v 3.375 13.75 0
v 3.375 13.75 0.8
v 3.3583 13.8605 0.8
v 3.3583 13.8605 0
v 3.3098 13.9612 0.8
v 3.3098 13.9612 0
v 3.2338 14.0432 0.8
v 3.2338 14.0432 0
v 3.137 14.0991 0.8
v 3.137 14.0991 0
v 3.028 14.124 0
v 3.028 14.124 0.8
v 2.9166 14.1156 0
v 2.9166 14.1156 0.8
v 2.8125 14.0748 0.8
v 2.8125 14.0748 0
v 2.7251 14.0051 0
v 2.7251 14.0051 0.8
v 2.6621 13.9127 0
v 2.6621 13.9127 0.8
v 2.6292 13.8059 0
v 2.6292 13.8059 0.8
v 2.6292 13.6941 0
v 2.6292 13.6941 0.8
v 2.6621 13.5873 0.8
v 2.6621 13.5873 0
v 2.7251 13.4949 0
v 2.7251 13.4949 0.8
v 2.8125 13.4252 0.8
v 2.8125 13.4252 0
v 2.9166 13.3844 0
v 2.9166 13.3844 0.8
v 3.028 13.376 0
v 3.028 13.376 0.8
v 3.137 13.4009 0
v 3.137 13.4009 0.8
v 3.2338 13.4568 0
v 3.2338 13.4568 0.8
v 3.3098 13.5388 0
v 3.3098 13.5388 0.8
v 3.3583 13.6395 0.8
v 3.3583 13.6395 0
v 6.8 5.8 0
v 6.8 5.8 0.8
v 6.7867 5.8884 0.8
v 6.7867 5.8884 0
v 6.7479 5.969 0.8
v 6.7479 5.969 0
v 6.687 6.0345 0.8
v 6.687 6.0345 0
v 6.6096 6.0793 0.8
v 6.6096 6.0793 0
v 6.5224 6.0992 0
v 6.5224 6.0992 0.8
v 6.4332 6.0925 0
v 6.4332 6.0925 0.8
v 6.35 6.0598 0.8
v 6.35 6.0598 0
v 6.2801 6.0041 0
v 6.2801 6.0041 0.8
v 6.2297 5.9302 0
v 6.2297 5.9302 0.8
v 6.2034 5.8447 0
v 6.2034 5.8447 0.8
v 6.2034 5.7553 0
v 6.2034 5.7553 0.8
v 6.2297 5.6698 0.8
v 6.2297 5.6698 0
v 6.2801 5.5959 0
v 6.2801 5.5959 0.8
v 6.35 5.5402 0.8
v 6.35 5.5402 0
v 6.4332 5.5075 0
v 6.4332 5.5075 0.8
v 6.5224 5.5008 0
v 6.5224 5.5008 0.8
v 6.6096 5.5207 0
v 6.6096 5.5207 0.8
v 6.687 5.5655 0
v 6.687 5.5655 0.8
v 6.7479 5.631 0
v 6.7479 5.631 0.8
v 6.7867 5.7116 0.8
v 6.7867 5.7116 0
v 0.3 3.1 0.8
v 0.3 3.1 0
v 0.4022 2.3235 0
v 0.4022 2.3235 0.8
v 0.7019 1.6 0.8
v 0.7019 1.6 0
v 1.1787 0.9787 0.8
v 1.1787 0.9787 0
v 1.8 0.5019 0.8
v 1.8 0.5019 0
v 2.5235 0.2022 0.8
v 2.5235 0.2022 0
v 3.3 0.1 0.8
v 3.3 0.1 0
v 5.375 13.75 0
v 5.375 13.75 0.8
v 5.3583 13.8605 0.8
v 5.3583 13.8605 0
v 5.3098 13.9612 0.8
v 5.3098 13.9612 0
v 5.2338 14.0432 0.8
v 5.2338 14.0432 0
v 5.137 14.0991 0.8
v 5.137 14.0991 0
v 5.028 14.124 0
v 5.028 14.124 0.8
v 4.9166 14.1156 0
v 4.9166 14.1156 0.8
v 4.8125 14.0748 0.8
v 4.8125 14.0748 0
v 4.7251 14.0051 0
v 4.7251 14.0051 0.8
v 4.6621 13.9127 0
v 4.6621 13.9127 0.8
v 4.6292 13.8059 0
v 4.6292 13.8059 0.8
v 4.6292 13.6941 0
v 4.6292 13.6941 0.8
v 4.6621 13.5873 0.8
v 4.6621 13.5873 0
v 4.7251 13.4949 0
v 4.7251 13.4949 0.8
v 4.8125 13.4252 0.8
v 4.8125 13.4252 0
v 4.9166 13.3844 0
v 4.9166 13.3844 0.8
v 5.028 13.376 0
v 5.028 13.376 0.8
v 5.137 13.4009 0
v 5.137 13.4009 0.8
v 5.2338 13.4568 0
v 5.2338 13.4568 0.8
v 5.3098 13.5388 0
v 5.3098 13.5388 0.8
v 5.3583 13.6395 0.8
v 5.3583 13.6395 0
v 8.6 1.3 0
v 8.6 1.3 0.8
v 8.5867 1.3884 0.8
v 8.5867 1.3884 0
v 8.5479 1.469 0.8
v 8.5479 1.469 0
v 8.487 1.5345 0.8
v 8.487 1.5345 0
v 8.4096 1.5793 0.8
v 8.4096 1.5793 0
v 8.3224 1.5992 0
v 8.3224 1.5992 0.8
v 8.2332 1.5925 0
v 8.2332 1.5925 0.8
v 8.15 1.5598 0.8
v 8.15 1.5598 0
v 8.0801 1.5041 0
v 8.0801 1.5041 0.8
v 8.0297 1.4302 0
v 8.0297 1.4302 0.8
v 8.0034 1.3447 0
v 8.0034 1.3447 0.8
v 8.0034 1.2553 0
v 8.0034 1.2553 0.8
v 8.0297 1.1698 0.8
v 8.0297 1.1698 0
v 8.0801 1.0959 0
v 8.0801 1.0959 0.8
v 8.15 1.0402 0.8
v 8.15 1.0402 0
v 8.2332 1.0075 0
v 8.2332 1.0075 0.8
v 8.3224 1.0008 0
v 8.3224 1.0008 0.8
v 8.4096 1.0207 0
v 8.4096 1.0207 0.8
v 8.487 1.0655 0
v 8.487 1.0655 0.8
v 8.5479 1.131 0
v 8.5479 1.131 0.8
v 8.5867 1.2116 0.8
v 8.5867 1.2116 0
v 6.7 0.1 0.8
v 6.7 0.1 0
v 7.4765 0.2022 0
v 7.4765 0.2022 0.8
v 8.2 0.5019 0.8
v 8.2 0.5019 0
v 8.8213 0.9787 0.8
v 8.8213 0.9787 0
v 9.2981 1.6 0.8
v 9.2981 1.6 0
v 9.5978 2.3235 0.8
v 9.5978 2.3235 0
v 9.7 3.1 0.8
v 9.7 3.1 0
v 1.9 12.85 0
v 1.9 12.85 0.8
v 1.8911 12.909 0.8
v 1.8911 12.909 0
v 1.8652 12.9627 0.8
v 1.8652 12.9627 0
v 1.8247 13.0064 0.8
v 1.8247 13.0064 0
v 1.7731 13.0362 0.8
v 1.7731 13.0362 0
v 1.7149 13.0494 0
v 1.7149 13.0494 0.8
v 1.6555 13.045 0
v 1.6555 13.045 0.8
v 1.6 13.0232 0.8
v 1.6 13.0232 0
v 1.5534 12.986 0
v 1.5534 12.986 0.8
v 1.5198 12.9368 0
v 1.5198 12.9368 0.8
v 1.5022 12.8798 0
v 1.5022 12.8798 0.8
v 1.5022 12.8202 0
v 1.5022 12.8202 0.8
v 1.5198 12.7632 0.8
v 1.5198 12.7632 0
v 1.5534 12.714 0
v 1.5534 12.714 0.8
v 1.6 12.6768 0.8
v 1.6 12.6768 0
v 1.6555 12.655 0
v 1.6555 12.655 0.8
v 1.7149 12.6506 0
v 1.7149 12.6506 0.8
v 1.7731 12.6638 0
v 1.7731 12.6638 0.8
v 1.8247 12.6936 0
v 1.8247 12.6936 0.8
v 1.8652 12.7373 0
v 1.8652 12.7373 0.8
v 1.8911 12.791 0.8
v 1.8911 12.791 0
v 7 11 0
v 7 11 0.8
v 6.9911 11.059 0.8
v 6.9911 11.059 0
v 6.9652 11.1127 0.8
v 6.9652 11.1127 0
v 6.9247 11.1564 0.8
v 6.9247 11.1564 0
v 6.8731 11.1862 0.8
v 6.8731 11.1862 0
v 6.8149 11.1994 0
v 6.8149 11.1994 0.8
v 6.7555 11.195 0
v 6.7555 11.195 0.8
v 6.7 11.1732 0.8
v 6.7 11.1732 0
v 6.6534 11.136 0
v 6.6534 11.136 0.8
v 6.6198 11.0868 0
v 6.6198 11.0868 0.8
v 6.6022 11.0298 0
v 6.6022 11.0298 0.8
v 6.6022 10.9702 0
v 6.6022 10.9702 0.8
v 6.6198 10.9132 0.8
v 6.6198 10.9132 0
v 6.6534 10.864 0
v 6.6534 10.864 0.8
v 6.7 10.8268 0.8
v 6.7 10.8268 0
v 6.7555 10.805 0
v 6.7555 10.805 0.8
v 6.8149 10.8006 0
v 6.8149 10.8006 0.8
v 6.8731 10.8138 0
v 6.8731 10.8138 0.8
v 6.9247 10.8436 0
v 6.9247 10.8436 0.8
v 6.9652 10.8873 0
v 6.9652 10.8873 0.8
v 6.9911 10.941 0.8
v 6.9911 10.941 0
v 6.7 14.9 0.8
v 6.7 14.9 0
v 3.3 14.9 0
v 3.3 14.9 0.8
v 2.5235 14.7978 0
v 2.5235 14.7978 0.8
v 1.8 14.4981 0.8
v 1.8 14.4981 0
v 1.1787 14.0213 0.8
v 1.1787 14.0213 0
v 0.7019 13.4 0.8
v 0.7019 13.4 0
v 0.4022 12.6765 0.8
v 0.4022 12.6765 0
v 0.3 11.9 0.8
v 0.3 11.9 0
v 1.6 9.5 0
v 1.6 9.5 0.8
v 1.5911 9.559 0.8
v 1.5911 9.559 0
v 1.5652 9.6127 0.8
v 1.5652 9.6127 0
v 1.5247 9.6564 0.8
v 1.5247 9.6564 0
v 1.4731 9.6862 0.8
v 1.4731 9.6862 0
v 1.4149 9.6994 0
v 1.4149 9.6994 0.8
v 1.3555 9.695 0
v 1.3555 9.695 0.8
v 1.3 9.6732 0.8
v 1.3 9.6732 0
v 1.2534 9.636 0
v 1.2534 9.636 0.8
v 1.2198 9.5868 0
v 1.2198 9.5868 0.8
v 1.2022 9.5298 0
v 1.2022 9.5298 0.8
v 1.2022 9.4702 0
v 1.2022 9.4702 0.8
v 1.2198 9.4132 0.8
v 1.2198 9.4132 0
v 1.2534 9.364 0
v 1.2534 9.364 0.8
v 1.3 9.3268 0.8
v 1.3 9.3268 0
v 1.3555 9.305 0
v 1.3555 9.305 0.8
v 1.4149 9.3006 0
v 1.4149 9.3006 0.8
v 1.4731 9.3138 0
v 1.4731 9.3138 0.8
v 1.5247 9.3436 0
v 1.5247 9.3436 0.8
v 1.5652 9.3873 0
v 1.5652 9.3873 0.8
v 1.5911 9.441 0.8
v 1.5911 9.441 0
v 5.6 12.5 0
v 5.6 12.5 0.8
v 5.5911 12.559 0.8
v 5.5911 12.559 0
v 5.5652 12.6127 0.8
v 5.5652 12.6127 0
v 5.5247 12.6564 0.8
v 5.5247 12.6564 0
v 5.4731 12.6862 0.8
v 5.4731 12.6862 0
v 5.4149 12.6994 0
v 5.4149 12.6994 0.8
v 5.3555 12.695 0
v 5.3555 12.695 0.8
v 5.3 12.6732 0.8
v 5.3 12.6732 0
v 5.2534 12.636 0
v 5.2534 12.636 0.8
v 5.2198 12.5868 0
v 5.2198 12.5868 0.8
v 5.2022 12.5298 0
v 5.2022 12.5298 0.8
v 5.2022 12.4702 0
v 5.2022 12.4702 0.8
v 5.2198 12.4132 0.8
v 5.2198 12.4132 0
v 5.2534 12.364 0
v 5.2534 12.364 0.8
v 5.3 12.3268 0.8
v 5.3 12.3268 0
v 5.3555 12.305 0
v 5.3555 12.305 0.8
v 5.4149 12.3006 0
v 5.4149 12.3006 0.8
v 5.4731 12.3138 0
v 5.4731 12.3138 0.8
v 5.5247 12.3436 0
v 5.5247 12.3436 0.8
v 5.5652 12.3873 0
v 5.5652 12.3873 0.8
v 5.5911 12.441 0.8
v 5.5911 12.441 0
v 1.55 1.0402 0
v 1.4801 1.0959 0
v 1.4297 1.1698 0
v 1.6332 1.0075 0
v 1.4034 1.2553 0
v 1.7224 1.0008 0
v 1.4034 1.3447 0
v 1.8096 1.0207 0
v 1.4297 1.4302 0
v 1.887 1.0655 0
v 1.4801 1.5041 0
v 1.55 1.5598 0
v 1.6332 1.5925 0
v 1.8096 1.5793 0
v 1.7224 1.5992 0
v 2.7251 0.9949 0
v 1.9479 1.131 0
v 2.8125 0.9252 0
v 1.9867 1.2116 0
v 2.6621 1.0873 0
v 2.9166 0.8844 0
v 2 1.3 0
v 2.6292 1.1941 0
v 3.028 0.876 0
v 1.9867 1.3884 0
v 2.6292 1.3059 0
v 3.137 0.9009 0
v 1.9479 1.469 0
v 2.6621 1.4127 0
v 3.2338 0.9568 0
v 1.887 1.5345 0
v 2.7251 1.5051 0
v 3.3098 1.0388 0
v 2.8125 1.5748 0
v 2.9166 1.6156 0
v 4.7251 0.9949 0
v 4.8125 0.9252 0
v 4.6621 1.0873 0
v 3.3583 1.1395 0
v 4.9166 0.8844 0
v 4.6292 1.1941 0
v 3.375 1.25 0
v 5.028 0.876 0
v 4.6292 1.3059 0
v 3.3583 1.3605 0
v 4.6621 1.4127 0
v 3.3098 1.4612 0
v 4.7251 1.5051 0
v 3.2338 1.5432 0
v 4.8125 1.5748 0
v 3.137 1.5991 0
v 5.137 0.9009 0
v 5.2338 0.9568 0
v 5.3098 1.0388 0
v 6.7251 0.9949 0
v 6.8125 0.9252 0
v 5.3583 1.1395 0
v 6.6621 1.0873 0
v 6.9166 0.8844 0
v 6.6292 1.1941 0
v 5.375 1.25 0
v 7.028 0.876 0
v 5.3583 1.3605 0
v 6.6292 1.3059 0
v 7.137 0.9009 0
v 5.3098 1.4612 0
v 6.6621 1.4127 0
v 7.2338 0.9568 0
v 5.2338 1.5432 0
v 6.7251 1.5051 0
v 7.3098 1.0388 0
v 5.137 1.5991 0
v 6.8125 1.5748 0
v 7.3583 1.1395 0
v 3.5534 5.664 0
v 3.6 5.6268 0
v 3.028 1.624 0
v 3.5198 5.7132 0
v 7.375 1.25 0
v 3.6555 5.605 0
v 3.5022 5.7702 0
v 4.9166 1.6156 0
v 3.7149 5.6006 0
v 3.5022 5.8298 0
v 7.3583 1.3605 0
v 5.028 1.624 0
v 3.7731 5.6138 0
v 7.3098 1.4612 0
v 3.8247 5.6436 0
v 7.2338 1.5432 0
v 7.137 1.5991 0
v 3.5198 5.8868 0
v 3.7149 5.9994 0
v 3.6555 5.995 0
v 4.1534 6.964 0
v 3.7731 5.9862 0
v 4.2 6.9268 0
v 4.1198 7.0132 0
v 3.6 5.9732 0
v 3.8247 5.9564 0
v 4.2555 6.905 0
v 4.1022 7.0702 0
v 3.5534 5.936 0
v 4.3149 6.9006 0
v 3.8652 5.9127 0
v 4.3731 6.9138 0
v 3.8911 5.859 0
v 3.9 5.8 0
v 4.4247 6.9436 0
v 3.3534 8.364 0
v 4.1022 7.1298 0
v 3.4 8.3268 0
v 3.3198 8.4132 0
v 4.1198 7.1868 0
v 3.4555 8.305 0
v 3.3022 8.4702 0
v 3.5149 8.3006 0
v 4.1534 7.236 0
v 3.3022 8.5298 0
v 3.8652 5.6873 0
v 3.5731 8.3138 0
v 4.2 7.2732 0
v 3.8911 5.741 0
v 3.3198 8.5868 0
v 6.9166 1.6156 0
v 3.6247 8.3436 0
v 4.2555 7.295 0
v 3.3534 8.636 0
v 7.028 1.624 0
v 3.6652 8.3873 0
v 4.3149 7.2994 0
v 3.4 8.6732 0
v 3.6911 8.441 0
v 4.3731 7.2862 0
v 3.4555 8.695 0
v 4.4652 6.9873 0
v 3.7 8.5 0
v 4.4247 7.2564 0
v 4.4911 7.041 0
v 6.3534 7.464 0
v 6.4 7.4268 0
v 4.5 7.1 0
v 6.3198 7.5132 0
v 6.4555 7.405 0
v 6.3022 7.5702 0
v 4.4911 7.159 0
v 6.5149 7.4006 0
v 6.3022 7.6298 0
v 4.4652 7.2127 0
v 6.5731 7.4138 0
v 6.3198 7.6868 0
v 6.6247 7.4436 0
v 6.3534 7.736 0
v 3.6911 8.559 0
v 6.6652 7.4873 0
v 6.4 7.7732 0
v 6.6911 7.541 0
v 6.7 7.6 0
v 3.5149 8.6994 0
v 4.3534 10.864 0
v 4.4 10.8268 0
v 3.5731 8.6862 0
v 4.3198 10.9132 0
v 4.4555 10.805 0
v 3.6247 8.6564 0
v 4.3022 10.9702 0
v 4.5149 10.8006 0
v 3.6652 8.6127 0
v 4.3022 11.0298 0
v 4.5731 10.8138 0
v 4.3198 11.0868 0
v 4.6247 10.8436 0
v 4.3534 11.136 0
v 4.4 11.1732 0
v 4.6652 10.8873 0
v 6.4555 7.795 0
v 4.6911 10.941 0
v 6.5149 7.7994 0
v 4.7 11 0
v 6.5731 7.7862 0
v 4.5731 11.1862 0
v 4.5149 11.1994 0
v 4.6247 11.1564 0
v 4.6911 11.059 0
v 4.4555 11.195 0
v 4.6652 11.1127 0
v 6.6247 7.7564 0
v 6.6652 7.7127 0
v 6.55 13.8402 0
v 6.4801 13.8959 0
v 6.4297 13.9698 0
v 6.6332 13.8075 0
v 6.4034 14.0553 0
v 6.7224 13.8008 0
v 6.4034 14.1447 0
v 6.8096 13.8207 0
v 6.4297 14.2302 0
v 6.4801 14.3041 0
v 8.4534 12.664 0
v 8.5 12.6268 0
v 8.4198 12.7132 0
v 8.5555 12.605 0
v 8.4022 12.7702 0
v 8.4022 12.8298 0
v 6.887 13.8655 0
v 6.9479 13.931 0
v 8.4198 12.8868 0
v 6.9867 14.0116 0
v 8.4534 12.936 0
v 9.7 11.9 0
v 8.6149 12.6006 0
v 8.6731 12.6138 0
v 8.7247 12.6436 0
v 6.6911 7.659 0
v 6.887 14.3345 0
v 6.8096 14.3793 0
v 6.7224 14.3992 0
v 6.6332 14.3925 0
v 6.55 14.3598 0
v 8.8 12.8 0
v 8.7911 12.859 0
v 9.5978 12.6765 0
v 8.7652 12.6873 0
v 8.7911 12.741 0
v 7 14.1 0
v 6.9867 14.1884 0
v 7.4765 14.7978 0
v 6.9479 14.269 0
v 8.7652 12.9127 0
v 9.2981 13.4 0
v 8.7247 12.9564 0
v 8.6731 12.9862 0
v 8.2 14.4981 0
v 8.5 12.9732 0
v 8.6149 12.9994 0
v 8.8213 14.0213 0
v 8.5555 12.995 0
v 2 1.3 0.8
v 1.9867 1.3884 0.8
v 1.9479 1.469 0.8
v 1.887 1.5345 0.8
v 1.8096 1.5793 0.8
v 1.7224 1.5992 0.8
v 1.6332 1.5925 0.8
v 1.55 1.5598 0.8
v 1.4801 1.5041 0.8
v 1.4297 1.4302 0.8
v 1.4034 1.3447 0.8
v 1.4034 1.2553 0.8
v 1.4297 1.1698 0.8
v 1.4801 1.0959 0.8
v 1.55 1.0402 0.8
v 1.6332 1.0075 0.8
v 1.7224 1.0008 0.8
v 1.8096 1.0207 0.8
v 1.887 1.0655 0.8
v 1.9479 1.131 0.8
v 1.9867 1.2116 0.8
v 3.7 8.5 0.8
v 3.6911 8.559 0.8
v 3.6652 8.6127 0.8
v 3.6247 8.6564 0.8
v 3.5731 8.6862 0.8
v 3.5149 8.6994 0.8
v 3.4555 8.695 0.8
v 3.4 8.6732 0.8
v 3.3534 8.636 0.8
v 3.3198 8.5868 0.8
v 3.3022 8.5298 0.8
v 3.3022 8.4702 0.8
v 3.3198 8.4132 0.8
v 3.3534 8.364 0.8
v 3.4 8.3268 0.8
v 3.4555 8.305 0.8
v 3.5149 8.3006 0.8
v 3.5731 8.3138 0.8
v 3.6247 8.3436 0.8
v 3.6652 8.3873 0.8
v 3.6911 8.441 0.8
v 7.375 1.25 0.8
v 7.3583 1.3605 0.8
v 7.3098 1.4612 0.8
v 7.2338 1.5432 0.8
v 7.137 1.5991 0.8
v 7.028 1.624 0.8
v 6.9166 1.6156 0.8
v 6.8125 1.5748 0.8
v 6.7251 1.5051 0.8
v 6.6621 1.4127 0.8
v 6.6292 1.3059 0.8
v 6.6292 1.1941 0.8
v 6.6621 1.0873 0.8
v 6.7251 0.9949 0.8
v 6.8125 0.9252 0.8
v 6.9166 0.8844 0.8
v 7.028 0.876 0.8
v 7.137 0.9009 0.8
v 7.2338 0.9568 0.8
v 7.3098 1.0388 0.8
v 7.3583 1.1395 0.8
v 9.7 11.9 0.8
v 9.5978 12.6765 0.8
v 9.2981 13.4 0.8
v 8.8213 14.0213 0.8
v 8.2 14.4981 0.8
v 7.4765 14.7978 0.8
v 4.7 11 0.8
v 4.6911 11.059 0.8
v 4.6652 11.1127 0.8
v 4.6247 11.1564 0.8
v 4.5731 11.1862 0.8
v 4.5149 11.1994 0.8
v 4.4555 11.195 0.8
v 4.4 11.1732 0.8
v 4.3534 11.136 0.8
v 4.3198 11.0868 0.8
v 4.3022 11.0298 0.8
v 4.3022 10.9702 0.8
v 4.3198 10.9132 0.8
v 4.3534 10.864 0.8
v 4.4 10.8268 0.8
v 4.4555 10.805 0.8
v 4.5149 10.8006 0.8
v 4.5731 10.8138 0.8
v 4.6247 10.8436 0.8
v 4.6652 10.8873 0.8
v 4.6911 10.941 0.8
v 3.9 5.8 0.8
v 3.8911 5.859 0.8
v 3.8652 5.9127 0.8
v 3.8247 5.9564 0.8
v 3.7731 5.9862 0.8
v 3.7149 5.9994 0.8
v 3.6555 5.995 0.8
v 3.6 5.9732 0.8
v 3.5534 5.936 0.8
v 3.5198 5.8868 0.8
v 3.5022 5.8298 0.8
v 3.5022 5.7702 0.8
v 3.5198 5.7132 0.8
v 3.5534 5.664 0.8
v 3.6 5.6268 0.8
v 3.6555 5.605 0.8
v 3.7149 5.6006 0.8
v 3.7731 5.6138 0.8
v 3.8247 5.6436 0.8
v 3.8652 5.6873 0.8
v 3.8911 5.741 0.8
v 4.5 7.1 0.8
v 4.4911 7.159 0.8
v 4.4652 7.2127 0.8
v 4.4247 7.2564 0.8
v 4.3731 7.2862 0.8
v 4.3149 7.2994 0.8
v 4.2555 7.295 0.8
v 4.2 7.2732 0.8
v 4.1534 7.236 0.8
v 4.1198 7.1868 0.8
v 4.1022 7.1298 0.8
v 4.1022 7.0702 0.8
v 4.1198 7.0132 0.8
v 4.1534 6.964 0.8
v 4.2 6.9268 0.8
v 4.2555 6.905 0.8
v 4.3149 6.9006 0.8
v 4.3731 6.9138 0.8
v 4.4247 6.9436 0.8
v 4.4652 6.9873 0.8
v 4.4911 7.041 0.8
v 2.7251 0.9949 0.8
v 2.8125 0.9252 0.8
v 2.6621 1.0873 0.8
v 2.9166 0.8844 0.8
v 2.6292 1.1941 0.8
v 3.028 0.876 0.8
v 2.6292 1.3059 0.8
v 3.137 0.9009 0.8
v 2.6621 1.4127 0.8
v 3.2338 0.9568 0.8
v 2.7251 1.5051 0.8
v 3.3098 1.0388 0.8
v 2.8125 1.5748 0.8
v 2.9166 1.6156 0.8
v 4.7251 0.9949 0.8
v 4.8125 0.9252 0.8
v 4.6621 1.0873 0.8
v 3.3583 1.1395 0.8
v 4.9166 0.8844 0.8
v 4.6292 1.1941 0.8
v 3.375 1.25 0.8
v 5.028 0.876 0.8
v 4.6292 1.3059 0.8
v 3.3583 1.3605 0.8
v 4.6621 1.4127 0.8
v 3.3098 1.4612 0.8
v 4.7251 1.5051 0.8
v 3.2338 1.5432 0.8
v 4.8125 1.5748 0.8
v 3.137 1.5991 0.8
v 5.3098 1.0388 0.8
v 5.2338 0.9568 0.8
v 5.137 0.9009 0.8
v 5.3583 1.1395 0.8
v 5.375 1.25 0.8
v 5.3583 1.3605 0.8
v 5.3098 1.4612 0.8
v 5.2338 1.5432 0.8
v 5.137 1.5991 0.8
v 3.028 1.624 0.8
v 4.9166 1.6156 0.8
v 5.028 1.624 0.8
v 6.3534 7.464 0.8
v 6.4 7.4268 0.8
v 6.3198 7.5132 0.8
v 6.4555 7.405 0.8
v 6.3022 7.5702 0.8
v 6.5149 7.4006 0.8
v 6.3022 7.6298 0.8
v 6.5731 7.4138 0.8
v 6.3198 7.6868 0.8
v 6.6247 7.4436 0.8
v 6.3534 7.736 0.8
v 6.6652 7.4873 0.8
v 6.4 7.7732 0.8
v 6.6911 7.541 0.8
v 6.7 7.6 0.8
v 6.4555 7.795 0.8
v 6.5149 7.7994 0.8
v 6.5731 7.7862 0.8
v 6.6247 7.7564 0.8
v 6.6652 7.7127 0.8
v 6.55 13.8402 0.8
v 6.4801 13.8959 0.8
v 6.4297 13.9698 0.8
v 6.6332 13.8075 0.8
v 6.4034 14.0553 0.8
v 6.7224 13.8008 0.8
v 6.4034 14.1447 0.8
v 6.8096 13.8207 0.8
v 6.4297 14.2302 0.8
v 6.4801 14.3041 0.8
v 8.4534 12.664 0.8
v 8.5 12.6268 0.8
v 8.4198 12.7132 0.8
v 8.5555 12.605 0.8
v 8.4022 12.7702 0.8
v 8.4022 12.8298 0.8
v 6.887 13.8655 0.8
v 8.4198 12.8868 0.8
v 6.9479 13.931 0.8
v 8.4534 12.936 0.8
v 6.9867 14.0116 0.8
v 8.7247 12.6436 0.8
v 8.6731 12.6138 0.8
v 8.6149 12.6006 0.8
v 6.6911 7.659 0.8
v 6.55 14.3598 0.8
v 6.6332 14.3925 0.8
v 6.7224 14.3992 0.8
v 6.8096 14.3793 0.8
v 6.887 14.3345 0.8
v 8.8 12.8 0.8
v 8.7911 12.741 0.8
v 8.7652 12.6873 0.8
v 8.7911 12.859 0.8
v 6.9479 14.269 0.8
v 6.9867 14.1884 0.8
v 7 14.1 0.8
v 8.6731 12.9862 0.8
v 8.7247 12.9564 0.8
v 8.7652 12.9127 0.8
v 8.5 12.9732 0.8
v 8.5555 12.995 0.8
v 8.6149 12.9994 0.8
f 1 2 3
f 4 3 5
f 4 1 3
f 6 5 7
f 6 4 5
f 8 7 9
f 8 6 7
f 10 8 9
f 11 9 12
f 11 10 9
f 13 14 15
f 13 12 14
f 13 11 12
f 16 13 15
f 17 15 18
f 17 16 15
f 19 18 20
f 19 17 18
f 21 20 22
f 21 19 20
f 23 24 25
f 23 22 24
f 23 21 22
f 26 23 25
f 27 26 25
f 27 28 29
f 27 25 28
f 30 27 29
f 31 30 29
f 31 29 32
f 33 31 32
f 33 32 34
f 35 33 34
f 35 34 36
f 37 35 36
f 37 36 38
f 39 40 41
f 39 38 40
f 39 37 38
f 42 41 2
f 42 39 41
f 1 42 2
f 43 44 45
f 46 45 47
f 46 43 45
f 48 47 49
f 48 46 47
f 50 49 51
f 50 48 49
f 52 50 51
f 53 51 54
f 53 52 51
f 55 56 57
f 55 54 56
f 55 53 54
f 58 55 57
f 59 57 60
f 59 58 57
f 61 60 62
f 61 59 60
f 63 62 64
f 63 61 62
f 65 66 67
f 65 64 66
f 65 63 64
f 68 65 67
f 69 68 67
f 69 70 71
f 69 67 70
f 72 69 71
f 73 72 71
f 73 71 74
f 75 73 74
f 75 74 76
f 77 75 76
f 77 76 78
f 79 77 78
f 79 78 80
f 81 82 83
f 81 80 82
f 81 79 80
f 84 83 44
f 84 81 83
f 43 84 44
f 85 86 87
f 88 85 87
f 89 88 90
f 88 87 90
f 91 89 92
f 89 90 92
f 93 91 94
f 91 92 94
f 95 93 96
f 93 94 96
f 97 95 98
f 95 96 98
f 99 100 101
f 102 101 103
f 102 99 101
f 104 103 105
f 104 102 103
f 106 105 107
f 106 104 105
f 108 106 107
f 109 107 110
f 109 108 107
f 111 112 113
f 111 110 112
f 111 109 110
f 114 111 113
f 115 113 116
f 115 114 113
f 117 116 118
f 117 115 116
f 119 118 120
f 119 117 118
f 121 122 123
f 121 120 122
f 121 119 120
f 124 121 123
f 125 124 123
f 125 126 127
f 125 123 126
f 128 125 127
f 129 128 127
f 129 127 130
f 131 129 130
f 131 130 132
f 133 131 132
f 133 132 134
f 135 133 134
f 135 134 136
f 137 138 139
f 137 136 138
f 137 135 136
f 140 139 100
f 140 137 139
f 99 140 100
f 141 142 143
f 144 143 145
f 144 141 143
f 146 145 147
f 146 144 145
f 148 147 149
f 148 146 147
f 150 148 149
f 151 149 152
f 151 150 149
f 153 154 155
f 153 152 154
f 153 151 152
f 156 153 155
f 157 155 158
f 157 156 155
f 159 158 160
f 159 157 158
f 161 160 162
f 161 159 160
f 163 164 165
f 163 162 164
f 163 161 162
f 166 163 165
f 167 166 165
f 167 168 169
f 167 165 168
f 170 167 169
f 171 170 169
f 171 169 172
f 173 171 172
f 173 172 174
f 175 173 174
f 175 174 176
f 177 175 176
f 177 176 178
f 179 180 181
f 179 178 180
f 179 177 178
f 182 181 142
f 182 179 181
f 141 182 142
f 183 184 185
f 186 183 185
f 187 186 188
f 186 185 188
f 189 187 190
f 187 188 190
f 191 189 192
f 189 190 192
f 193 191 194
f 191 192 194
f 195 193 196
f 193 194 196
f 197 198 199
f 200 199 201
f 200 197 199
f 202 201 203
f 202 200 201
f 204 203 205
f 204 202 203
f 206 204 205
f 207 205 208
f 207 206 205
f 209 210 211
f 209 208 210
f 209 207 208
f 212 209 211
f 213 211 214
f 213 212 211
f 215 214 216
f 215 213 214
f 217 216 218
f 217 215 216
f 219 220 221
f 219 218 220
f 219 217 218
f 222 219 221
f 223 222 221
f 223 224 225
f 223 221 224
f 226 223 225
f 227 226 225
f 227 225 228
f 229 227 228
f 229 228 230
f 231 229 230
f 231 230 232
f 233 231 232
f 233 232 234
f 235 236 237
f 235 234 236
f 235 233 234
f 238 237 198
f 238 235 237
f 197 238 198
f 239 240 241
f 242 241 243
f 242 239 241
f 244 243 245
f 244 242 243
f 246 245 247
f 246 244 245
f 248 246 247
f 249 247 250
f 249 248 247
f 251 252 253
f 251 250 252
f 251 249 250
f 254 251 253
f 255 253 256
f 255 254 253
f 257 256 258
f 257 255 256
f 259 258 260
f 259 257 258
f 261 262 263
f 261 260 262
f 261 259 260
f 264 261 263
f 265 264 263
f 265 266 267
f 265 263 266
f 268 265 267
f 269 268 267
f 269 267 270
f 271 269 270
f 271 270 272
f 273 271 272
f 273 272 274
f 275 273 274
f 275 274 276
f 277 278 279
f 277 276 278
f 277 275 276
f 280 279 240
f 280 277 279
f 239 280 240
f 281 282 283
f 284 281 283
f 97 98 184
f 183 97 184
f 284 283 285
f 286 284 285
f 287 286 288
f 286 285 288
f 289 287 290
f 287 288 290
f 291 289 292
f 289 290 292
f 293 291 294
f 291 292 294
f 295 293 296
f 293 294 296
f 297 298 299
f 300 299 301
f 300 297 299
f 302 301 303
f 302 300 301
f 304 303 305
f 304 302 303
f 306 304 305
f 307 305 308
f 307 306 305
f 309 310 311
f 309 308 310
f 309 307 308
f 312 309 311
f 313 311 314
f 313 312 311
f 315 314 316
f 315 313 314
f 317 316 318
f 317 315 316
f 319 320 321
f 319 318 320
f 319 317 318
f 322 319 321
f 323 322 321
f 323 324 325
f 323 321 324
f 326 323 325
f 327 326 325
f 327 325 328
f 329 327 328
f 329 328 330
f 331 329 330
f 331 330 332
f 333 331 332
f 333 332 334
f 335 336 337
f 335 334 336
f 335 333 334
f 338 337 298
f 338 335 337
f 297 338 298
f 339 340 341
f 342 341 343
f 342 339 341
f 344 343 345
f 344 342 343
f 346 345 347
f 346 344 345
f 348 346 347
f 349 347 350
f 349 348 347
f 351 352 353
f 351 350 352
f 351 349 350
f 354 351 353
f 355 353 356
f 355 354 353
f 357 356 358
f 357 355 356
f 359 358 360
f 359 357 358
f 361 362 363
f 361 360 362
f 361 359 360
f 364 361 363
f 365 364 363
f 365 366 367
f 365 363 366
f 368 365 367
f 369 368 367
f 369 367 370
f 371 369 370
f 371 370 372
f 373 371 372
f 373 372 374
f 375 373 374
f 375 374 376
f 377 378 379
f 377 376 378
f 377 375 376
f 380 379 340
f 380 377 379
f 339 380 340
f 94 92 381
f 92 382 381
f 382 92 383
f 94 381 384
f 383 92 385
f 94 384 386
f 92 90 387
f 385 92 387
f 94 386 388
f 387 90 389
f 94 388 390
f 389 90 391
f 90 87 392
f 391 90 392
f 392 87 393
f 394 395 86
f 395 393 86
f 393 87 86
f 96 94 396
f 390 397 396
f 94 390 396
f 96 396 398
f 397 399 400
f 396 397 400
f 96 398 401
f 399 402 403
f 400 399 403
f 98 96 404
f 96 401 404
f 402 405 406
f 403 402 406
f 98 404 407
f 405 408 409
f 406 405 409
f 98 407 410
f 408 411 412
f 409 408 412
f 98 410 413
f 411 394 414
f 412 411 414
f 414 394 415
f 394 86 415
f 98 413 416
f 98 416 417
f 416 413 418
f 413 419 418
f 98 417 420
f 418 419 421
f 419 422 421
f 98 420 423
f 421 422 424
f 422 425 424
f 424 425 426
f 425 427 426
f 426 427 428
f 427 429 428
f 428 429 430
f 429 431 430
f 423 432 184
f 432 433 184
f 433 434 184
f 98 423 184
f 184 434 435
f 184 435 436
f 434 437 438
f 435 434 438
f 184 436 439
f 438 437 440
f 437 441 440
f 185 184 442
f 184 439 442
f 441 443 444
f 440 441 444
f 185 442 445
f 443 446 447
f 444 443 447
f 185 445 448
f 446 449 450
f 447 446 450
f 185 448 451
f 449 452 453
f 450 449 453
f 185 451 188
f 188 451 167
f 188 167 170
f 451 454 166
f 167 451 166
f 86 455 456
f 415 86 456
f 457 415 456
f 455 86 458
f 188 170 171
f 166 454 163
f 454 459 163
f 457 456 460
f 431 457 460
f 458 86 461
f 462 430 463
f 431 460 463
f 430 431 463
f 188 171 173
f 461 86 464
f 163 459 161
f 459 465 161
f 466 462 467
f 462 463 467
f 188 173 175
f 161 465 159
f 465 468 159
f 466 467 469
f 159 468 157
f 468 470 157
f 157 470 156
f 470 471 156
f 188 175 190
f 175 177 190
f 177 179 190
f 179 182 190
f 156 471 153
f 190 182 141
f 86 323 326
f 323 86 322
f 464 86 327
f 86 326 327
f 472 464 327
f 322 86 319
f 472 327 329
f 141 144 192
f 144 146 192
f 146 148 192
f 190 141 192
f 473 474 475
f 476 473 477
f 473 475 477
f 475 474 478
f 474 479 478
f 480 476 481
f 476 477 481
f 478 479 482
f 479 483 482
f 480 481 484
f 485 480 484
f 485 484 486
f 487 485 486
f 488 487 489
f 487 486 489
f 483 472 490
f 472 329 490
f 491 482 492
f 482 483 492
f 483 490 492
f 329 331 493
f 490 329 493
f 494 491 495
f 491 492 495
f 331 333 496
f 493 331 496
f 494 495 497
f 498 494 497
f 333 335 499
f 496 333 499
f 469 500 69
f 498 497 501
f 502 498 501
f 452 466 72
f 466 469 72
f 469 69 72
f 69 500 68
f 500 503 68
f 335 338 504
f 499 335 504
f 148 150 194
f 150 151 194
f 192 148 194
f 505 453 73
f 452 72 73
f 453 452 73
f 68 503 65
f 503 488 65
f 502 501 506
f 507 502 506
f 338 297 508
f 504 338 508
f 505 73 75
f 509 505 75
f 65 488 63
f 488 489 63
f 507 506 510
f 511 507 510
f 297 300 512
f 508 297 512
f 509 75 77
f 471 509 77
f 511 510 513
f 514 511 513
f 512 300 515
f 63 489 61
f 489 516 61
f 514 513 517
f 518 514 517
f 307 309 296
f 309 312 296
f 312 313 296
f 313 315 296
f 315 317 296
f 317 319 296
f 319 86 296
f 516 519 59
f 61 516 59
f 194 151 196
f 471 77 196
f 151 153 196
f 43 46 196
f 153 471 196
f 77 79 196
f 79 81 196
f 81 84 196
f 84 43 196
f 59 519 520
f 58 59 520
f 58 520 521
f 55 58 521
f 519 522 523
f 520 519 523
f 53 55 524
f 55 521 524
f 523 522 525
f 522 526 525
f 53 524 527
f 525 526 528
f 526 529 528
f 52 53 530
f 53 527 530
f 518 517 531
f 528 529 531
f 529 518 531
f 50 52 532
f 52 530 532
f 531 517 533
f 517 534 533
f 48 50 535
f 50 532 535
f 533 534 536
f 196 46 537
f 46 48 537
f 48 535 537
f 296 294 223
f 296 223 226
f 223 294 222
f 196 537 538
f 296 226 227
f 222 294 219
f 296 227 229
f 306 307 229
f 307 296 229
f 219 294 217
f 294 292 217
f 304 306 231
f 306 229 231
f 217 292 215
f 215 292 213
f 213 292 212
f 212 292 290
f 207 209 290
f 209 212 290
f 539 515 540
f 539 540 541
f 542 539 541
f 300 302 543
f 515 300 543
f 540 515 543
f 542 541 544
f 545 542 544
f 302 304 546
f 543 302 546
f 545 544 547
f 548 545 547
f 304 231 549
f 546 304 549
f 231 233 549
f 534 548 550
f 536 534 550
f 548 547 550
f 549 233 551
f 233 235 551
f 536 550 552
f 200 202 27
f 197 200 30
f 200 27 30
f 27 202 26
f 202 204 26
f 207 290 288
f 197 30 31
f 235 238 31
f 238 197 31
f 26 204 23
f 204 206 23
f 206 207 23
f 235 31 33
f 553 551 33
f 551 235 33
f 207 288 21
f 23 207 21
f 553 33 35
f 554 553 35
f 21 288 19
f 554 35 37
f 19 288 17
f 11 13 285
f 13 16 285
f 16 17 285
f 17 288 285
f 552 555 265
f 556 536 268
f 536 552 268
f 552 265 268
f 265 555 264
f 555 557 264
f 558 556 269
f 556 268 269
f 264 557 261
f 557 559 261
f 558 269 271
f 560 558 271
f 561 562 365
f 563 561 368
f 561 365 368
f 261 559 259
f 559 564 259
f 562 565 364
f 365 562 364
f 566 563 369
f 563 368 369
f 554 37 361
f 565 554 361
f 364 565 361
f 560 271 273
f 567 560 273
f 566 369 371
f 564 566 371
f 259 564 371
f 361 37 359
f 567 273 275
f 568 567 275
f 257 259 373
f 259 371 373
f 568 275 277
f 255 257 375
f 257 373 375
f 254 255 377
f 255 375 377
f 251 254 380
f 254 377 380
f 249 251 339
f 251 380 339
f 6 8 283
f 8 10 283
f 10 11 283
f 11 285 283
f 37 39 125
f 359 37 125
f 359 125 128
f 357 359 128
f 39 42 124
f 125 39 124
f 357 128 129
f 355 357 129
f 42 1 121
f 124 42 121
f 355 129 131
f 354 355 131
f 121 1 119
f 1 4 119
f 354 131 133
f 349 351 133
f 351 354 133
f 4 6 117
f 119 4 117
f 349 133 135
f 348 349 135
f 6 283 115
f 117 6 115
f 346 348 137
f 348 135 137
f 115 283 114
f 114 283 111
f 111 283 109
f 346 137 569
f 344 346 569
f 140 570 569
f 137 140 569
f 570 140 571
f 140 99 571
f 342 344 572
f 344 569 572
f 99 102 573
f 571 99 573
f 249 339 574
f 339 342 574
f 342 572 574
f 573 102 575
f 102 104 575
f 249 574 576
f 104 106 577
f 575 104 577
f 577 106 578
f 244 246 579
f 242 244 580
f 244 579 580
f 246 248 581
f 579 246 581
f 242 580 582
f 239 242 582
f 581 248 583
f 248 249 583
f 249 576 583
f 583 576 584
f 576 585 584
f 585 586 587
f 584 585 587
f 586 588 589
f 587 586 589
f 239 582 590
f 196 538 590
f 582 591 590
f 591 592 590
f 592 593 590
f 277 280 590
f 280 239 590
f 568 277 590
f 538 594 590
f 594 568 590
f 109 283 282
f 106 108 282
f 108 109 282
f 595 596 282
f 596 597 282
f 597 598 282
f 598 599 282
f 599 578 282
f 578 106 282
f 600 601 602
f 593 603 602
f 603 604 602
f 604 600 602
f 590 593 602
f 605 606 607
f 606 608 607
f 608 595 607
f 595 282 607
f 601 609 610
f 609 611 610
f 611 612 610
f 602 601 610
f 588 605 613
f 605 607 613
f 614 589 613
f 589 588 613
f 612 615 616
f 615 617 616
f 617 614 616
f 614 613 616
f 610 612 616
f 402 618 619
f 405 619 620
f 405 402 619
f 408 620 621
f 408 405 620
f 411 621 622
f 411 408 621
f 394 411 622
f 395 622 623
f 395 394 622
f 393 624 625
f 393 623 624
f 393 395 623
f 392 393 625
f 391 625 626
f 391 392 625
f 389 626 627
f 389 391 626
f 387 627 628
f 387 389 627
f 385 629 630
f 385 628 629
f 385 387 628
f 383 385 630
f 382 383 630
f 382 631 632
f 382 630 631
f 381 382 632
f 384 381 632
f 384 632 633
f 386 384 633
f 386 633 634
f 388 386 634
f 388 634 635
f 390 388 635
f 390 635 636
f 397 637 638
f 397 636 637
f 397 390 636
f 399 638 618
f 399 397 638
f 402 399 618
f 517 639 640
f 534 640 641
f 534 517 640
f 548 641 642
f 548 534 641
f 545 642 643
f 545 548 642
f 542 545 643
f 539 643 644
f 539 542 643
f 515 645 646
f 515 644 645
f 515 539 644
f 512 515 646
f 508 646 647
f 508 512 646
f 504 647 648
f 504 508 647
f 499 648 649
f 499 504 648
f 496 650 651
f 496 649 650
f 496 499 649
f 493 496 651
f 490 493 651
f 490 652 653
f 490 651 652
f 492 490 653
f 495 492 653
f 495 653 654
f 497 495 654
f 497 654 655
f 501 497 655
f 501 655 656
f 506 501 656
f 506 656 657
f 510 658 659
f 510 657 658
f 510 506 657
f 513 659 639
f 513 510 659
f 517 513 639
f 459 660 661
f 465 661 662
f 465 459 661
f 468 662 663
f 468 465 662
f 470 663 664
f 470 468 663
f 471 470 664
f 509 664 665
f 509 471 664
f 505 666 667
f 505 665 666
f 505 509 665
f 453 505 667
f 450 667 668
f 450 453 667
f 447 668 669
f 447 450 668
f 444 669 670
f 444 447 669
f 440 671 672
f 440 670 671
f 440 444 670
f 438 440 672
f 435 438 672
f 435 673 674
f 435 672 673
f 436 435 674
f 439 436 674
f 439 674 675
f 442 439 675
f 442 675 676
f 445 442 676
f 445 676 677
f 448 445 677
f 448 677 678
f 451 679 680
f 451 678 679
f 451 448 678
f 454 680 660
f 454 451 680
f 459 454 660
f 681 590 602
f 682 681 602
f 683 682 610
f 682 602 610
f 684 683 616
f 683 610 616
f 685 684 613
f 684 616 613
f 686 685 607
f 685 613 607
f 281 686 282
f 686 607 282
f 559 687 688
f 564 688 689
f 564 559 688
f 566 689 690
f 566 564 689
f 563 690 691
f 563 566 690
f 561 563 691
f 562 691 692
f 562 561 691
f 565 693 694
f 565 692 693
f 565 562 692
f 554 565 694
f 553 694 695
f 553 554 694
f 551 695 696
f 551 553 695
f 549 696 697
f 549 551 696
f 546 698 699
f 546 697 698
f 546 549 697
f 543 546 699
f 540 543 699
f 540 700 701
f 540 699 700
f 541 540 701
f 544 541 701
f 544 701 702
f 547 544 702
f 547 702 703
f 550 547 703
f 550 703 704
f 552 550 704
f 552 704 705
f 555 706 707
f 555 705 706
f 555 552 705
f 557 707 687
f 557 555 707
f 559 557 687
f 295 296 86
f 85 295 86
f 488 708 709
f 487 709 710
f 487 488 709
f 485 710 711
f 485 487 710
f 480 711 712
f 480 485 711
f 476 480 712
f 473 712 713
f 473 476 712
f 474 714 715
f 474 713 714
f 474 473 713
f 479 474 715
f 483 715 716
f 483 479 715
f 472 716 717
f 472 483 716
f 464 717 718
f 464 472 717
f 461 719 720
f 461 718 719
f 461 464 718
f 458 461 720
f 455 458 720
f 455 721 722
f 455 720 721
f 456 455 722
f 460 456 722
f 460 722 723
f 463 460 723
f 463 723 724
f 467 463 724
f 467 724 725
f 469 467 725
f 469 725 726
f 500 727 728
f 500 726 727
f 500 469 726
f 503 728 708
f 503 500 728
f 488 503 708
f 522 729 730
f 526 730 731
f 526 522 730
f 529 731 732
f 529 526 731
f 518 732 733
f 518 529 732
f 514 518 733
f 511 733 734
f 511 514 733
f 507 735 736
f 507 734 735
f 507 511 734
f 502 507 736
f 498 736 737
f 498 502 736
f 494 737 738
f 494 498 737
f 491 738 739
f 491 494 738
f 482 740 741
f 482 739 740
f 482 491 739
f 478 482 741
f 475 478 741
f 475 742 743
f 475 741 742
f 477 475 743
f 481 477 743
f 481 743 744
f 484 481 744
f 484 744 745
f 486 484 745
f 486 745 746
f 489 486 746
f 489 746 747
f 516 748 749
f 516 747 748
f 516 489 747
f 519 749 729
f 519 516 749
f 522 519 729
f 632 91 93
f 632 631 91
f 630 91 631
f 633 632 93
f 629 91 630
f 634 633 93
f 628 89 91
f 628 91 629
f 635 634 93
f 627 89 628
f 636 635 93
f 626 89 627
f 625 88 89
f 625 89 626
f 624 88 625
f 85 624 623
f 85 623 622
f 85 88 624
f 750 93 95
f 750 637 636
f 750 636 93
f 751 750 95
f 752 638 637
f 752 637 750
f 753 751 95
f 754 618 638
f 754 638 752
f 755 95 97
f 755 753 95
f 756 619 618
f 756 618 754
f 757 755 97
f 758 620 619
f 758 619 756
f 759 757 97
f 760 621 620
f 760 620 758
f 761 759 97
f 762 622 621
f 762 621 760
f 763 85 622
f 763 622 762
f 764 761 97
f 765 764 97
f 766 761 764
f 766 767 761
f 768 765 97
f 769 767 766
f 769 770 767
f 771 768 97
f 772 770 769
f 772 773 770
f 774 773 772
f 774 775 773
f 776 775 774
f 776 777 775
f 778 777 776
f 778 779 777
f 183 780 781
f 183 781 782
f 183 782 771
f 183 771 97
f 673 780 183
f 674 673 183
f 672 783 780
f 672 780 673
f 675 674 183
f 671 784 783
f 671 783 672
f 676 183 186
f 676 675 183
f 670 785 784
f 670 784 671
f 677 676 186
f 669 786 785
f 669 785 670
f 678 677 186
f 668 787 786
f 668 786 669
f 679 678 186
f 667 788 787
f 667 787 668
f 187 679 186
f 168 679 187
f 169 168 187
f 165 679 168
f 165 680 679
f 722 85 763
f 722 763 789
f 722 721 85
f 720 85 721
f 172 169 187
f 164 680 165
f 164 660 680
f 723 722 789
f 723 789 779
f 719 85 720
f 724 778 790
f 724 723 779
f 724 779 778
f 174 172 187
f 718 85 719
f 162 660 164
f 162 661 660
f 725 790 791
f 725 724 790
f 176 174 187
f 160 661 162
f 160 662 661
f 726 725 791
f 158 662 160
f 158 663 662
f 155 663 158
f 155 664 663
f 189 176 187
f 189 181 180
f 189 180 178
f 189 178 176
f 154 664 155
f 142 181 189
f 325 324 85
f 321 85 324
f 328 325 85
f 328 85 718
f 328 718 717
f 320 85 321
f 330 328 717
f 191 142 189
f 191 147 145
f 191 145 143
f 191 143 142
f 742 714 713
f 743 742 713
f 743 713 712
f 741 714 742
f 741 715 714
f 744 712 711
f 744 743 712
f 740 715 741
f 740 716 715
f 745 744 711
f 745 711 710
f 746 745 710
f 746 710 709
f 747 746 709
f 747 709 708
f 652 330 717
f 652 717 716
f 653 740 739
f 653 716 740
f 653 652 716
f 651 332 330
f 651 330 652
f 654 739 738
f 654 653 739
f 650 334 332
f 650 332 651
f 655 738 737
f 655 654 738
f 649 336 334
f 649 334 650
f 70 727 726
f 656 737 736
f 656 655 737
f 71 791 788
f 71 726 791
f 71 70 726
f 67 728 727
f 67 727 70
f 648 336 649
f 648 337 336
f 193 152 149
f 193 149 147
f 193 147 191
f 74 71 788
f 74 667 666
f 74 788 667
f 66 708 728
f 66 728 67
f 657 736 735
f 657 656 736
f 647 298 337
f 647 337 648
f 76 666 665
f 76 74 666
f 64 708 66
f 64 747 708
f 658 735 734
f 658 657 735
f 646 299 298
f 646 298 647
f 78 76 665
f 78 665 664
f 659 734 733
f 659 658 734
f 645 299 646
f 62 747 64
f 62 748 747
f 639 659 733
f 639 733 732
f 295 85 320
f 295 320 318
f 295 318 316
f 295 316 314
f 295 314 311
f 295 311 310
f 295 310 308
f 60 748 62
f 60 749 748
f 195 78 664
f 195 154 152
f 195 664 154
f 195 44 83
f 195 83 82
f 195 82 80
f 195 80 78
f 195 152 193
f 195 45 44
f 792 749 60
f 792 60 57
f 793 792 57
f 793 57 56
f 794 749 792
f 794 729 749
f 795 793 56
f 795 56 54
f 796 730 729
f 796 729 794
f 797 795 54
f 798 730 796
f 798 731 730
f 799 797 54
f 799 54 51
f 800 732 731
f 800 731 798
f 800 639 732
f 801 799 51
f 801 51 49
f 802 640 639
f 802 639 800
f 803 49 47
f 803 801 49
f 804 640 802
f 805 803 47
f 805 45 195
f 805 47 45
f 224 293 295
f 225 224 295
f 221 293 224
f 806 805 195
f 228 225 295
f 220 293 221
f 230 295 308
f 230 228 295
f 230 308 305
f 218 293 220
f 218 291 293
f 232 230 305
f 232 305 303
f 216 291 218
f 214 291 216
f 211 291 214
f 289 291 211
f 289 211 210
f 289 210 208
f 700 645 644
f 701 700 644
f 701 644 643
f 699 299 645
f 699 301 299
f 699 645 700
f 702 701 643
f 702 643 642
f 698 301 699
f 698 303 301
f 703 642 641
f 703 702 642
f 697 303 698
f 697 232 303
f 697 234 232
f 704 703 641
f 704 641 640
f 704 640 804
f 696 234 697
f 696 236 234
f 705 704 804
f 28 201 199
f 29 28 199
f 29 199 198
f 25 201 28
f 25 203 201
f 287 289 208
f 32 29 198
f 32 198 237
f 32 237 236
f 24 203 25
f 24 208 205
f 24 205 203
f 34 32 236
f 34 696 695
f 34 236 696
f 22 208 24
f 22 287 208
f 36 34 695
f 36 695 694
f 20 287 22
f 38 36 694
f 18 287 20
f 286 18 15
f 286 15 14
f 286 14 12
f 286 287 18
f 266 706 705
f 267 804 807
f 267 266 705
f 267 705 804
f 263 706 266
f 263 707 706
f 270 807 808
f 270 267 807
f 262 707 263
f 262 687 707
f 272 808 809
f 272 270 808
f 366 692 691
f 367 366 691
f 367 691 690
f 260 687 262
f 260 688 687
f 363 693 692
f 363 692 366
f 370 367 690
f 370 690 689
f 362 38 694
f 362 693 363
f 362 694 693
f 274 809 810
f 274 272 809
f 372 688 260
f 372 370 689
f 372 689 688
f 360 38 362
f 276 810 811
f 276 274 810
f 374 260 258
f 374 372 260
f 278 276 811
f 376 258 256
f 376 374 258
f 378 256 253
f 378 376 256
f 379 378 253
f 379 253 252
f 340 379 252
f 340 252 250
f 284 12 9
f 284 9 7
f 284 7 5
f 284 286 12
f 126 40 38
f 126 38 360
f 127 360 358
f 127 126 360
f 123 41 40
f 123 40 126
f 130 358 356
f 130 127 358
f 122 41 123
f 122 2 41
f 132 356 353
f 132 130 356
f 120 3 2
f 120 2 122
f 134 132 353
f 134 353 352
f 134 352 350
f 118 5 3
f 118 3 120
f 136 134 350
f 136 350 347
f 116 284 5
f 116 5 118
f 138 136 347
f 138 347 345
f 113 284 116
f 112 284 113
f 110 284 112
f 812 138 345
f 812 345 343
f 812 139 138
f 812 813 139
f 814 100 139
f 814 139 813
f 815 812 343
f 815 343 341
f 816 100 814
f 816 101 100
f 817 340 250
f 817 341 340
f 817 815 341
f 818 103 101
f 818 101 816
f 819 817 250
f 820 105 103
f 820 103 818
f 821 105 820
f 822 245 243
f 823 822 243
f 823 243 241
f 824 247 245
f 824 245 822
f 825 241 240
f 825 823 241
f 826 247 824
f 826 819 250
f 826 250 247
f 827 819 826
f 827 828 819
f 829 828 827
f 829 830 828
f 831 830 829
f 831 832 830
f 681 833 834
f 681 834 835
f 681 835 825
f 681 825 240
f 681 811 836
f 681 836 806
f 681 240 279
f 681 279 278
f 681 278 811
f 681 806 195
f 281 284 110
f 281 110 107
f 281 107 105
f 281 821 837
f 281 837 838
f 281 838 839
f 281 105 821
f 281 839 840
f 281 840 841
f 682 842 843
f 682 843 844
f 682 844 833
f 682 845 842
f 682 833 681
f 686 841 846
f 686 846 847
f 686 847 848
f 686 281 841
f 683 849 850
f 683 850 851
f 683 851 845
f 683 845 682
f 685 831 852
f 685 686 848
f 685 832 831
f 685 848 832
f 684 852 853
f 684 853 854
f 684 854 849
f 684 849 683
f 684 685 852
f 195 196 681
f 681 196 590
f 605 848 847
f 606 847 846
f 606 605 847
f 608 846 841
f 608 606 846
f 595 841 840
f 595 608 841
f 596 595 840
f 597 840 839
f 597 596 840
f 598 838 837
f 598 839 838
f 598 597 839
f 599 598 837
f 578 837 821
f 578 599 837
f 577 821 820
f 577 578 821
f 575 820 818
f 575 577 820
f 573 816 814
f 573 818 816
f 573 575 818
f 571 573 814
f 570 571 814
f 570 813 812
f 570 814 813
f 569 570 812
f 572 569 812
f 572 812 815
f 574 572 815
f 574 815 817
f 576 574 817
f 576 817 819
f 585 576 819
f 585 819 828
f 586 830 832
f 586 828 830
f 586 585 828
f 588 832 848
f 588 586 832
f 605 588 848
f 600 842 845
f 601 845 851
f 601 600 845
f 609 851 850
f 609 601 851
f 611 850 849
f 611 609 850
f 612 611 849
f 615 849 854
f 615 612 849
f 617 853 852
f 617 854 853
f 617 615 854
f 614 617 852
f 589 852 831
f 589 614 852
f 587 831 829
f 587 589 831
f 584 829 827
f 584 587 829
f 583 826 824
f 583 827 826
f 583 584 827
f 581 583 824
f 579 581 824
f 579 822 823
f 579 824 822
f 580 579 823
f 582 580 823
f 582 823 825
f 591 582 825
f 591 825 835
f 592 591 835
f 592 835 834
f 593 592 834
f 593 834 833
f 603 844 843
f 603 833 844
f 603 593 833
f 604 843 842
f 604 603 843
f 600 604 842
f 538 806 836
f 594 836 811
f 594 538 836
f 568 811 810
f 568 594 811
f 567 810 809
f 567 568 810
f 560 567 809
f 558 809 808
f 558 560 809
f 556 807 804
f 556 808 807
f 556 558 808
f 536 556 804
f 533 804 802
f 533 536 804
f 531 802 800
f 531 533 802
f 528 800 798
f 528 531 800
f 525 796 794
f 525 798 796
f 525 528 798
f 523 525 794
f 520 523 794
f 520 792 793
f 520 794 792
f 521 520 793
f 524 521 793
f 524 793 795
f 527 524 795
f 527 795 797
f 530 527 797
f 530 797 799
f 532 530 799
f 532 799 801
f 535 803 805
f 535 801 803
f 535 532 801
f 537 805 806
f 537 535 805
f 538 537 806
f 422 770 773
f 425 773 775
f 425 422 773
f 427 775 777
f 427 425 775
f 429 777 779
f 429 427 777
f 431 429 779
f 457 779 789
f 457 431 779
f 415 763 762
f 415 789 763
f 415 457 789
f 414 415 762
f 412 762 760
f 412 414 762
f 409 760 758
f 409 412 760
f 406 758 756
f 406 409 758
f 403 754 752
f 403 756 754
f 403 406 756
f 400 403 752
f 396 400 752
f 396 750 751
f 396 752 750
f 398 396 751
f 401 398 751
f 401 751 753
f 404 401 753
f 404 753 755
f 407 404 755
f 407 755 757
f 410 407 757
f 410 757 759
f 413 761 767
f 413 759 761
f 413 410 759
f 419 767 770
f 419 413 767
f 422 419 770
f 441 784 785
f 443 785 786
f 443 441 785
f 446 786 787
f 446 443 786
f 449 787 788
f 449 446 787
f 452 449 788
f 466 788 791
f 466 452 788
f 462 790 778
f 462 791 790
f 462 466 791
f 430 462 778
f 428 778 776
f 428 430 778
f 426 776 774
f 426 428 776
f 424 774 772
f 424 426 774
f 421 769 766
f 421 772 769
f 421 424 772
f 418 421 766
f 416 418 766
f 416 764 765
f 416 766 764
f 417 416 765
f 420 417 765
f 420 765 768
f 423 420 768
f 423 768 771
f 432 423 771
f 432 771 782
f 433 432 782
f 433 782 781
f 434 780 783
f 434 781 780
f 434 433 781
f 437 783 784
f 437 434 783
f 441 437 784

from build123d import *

# Parameters (mm, degrees)
BOARD_DEPTH            = 0.8
SKETCH2_R              = 0.3
SKETCH2_R_2            = 0.375
NON_PLATED_HOLES_DEPTH = 18.79719079
SKETCH3_R              = 0.2
SKETCH3_R_2            = 0.3
PLATED_HOLES_DEPTH     = 18.79719079


with BuildPart() as part:
    # Sketch1 → BOARD (new body)
    with BuildSketch(Plane.XY):
        with BuildLine():
            Line((0.3, 11.9), (0.3, 3.1))
            ThreePointArc((0.3, 3.1), (1.178679656, 0.978679656), (3.3, 0.1))
            Line((3.3, 0.1), (6.7, 0.1))
            ThreePointArc((6.7, 0.1), (8.821320344, 0.978679656), (9.7, 3.1))
            Line((9.7, 3.1), (9.7, 11.9))
            ThreePointArc((9.7, 11.9), (8.821320344, 14.021320344), (6.7, 14.9))
            Line((6.7, 14.9), (3.3, 14.9))
            ThreePointArc((3.3, 14.9), (1.178679656, 14.021320344), (0.3, 11.9))
        make_face()
    extrude(amount=BOARD_DEPTH)

    # Sketch2 → NON-PLATED HOLES (cut, through all)
    with BuildSketch(Plane.XY):
        with Locations((1.7, 1.3)):
            Circle(SKETCH2_R)
        with Locations((8.3, 1.3)):
            Circle(SKETCH2_R)
        with Locations((6.7, 14.1)):
            Circle(SKETCH2_R)
        with Locations((5, 13.75)):
            Circle(SKETCH2_R_2)
        with Locations((3, 13.75)):
            Circle(SKETCH2_R_2)
        with Locations((3, 1.25)):
            Circle(SKETCH2_R_2)
        with Locations((5, 1.25)):
            Circle(SKETCH2_R_2)
        with Locations((7, 1.25)):
            Circle(SKETCH2_R_2)
    extrude(amount=NON_PLATED_HOLES_DEPTH, mode=Mode.SUBTRACT)

    # Sketch3 → PLATED HOLES (cut, through all)
    with BuildSketch(Plane.XY):
        with Locations((4.5, 11)):
            Circle(SKETCH3_R)
        with Locations((1.4, 9.5)):
            Circle(SKETCH3_R)
        with Locations((8.6, 12.8)):
            Circle(SKETCH3_R)
        with Locations((1.7, 12.85)):
            Circle(SKETCH3_R)
        with Locations((3.5, 8.5)):
            Circle(SKETCH3_R)
        with Locations((3.7, 5.8)):
            Circle(SKETCH3_R)
        with Locations((6.8, 11)):
            Circle(SKETCH3_R)
        with Locations((6.5, 7.6)):
            Circle(SKETCH3_R)
        with Locations((6.5, 5.8)):
            Circle(SKETCH3_R_2)
        with Locations((4.3, 7.1)):
            Circle(SKETCH3_R)
        with Locations((5.4, 12.5)):
            Circle(SKETCH3_R)
    extrude(amount=PLATED_HOLES_DEPTH, mode=Mode.SUBTRACT)


solid = part.part
